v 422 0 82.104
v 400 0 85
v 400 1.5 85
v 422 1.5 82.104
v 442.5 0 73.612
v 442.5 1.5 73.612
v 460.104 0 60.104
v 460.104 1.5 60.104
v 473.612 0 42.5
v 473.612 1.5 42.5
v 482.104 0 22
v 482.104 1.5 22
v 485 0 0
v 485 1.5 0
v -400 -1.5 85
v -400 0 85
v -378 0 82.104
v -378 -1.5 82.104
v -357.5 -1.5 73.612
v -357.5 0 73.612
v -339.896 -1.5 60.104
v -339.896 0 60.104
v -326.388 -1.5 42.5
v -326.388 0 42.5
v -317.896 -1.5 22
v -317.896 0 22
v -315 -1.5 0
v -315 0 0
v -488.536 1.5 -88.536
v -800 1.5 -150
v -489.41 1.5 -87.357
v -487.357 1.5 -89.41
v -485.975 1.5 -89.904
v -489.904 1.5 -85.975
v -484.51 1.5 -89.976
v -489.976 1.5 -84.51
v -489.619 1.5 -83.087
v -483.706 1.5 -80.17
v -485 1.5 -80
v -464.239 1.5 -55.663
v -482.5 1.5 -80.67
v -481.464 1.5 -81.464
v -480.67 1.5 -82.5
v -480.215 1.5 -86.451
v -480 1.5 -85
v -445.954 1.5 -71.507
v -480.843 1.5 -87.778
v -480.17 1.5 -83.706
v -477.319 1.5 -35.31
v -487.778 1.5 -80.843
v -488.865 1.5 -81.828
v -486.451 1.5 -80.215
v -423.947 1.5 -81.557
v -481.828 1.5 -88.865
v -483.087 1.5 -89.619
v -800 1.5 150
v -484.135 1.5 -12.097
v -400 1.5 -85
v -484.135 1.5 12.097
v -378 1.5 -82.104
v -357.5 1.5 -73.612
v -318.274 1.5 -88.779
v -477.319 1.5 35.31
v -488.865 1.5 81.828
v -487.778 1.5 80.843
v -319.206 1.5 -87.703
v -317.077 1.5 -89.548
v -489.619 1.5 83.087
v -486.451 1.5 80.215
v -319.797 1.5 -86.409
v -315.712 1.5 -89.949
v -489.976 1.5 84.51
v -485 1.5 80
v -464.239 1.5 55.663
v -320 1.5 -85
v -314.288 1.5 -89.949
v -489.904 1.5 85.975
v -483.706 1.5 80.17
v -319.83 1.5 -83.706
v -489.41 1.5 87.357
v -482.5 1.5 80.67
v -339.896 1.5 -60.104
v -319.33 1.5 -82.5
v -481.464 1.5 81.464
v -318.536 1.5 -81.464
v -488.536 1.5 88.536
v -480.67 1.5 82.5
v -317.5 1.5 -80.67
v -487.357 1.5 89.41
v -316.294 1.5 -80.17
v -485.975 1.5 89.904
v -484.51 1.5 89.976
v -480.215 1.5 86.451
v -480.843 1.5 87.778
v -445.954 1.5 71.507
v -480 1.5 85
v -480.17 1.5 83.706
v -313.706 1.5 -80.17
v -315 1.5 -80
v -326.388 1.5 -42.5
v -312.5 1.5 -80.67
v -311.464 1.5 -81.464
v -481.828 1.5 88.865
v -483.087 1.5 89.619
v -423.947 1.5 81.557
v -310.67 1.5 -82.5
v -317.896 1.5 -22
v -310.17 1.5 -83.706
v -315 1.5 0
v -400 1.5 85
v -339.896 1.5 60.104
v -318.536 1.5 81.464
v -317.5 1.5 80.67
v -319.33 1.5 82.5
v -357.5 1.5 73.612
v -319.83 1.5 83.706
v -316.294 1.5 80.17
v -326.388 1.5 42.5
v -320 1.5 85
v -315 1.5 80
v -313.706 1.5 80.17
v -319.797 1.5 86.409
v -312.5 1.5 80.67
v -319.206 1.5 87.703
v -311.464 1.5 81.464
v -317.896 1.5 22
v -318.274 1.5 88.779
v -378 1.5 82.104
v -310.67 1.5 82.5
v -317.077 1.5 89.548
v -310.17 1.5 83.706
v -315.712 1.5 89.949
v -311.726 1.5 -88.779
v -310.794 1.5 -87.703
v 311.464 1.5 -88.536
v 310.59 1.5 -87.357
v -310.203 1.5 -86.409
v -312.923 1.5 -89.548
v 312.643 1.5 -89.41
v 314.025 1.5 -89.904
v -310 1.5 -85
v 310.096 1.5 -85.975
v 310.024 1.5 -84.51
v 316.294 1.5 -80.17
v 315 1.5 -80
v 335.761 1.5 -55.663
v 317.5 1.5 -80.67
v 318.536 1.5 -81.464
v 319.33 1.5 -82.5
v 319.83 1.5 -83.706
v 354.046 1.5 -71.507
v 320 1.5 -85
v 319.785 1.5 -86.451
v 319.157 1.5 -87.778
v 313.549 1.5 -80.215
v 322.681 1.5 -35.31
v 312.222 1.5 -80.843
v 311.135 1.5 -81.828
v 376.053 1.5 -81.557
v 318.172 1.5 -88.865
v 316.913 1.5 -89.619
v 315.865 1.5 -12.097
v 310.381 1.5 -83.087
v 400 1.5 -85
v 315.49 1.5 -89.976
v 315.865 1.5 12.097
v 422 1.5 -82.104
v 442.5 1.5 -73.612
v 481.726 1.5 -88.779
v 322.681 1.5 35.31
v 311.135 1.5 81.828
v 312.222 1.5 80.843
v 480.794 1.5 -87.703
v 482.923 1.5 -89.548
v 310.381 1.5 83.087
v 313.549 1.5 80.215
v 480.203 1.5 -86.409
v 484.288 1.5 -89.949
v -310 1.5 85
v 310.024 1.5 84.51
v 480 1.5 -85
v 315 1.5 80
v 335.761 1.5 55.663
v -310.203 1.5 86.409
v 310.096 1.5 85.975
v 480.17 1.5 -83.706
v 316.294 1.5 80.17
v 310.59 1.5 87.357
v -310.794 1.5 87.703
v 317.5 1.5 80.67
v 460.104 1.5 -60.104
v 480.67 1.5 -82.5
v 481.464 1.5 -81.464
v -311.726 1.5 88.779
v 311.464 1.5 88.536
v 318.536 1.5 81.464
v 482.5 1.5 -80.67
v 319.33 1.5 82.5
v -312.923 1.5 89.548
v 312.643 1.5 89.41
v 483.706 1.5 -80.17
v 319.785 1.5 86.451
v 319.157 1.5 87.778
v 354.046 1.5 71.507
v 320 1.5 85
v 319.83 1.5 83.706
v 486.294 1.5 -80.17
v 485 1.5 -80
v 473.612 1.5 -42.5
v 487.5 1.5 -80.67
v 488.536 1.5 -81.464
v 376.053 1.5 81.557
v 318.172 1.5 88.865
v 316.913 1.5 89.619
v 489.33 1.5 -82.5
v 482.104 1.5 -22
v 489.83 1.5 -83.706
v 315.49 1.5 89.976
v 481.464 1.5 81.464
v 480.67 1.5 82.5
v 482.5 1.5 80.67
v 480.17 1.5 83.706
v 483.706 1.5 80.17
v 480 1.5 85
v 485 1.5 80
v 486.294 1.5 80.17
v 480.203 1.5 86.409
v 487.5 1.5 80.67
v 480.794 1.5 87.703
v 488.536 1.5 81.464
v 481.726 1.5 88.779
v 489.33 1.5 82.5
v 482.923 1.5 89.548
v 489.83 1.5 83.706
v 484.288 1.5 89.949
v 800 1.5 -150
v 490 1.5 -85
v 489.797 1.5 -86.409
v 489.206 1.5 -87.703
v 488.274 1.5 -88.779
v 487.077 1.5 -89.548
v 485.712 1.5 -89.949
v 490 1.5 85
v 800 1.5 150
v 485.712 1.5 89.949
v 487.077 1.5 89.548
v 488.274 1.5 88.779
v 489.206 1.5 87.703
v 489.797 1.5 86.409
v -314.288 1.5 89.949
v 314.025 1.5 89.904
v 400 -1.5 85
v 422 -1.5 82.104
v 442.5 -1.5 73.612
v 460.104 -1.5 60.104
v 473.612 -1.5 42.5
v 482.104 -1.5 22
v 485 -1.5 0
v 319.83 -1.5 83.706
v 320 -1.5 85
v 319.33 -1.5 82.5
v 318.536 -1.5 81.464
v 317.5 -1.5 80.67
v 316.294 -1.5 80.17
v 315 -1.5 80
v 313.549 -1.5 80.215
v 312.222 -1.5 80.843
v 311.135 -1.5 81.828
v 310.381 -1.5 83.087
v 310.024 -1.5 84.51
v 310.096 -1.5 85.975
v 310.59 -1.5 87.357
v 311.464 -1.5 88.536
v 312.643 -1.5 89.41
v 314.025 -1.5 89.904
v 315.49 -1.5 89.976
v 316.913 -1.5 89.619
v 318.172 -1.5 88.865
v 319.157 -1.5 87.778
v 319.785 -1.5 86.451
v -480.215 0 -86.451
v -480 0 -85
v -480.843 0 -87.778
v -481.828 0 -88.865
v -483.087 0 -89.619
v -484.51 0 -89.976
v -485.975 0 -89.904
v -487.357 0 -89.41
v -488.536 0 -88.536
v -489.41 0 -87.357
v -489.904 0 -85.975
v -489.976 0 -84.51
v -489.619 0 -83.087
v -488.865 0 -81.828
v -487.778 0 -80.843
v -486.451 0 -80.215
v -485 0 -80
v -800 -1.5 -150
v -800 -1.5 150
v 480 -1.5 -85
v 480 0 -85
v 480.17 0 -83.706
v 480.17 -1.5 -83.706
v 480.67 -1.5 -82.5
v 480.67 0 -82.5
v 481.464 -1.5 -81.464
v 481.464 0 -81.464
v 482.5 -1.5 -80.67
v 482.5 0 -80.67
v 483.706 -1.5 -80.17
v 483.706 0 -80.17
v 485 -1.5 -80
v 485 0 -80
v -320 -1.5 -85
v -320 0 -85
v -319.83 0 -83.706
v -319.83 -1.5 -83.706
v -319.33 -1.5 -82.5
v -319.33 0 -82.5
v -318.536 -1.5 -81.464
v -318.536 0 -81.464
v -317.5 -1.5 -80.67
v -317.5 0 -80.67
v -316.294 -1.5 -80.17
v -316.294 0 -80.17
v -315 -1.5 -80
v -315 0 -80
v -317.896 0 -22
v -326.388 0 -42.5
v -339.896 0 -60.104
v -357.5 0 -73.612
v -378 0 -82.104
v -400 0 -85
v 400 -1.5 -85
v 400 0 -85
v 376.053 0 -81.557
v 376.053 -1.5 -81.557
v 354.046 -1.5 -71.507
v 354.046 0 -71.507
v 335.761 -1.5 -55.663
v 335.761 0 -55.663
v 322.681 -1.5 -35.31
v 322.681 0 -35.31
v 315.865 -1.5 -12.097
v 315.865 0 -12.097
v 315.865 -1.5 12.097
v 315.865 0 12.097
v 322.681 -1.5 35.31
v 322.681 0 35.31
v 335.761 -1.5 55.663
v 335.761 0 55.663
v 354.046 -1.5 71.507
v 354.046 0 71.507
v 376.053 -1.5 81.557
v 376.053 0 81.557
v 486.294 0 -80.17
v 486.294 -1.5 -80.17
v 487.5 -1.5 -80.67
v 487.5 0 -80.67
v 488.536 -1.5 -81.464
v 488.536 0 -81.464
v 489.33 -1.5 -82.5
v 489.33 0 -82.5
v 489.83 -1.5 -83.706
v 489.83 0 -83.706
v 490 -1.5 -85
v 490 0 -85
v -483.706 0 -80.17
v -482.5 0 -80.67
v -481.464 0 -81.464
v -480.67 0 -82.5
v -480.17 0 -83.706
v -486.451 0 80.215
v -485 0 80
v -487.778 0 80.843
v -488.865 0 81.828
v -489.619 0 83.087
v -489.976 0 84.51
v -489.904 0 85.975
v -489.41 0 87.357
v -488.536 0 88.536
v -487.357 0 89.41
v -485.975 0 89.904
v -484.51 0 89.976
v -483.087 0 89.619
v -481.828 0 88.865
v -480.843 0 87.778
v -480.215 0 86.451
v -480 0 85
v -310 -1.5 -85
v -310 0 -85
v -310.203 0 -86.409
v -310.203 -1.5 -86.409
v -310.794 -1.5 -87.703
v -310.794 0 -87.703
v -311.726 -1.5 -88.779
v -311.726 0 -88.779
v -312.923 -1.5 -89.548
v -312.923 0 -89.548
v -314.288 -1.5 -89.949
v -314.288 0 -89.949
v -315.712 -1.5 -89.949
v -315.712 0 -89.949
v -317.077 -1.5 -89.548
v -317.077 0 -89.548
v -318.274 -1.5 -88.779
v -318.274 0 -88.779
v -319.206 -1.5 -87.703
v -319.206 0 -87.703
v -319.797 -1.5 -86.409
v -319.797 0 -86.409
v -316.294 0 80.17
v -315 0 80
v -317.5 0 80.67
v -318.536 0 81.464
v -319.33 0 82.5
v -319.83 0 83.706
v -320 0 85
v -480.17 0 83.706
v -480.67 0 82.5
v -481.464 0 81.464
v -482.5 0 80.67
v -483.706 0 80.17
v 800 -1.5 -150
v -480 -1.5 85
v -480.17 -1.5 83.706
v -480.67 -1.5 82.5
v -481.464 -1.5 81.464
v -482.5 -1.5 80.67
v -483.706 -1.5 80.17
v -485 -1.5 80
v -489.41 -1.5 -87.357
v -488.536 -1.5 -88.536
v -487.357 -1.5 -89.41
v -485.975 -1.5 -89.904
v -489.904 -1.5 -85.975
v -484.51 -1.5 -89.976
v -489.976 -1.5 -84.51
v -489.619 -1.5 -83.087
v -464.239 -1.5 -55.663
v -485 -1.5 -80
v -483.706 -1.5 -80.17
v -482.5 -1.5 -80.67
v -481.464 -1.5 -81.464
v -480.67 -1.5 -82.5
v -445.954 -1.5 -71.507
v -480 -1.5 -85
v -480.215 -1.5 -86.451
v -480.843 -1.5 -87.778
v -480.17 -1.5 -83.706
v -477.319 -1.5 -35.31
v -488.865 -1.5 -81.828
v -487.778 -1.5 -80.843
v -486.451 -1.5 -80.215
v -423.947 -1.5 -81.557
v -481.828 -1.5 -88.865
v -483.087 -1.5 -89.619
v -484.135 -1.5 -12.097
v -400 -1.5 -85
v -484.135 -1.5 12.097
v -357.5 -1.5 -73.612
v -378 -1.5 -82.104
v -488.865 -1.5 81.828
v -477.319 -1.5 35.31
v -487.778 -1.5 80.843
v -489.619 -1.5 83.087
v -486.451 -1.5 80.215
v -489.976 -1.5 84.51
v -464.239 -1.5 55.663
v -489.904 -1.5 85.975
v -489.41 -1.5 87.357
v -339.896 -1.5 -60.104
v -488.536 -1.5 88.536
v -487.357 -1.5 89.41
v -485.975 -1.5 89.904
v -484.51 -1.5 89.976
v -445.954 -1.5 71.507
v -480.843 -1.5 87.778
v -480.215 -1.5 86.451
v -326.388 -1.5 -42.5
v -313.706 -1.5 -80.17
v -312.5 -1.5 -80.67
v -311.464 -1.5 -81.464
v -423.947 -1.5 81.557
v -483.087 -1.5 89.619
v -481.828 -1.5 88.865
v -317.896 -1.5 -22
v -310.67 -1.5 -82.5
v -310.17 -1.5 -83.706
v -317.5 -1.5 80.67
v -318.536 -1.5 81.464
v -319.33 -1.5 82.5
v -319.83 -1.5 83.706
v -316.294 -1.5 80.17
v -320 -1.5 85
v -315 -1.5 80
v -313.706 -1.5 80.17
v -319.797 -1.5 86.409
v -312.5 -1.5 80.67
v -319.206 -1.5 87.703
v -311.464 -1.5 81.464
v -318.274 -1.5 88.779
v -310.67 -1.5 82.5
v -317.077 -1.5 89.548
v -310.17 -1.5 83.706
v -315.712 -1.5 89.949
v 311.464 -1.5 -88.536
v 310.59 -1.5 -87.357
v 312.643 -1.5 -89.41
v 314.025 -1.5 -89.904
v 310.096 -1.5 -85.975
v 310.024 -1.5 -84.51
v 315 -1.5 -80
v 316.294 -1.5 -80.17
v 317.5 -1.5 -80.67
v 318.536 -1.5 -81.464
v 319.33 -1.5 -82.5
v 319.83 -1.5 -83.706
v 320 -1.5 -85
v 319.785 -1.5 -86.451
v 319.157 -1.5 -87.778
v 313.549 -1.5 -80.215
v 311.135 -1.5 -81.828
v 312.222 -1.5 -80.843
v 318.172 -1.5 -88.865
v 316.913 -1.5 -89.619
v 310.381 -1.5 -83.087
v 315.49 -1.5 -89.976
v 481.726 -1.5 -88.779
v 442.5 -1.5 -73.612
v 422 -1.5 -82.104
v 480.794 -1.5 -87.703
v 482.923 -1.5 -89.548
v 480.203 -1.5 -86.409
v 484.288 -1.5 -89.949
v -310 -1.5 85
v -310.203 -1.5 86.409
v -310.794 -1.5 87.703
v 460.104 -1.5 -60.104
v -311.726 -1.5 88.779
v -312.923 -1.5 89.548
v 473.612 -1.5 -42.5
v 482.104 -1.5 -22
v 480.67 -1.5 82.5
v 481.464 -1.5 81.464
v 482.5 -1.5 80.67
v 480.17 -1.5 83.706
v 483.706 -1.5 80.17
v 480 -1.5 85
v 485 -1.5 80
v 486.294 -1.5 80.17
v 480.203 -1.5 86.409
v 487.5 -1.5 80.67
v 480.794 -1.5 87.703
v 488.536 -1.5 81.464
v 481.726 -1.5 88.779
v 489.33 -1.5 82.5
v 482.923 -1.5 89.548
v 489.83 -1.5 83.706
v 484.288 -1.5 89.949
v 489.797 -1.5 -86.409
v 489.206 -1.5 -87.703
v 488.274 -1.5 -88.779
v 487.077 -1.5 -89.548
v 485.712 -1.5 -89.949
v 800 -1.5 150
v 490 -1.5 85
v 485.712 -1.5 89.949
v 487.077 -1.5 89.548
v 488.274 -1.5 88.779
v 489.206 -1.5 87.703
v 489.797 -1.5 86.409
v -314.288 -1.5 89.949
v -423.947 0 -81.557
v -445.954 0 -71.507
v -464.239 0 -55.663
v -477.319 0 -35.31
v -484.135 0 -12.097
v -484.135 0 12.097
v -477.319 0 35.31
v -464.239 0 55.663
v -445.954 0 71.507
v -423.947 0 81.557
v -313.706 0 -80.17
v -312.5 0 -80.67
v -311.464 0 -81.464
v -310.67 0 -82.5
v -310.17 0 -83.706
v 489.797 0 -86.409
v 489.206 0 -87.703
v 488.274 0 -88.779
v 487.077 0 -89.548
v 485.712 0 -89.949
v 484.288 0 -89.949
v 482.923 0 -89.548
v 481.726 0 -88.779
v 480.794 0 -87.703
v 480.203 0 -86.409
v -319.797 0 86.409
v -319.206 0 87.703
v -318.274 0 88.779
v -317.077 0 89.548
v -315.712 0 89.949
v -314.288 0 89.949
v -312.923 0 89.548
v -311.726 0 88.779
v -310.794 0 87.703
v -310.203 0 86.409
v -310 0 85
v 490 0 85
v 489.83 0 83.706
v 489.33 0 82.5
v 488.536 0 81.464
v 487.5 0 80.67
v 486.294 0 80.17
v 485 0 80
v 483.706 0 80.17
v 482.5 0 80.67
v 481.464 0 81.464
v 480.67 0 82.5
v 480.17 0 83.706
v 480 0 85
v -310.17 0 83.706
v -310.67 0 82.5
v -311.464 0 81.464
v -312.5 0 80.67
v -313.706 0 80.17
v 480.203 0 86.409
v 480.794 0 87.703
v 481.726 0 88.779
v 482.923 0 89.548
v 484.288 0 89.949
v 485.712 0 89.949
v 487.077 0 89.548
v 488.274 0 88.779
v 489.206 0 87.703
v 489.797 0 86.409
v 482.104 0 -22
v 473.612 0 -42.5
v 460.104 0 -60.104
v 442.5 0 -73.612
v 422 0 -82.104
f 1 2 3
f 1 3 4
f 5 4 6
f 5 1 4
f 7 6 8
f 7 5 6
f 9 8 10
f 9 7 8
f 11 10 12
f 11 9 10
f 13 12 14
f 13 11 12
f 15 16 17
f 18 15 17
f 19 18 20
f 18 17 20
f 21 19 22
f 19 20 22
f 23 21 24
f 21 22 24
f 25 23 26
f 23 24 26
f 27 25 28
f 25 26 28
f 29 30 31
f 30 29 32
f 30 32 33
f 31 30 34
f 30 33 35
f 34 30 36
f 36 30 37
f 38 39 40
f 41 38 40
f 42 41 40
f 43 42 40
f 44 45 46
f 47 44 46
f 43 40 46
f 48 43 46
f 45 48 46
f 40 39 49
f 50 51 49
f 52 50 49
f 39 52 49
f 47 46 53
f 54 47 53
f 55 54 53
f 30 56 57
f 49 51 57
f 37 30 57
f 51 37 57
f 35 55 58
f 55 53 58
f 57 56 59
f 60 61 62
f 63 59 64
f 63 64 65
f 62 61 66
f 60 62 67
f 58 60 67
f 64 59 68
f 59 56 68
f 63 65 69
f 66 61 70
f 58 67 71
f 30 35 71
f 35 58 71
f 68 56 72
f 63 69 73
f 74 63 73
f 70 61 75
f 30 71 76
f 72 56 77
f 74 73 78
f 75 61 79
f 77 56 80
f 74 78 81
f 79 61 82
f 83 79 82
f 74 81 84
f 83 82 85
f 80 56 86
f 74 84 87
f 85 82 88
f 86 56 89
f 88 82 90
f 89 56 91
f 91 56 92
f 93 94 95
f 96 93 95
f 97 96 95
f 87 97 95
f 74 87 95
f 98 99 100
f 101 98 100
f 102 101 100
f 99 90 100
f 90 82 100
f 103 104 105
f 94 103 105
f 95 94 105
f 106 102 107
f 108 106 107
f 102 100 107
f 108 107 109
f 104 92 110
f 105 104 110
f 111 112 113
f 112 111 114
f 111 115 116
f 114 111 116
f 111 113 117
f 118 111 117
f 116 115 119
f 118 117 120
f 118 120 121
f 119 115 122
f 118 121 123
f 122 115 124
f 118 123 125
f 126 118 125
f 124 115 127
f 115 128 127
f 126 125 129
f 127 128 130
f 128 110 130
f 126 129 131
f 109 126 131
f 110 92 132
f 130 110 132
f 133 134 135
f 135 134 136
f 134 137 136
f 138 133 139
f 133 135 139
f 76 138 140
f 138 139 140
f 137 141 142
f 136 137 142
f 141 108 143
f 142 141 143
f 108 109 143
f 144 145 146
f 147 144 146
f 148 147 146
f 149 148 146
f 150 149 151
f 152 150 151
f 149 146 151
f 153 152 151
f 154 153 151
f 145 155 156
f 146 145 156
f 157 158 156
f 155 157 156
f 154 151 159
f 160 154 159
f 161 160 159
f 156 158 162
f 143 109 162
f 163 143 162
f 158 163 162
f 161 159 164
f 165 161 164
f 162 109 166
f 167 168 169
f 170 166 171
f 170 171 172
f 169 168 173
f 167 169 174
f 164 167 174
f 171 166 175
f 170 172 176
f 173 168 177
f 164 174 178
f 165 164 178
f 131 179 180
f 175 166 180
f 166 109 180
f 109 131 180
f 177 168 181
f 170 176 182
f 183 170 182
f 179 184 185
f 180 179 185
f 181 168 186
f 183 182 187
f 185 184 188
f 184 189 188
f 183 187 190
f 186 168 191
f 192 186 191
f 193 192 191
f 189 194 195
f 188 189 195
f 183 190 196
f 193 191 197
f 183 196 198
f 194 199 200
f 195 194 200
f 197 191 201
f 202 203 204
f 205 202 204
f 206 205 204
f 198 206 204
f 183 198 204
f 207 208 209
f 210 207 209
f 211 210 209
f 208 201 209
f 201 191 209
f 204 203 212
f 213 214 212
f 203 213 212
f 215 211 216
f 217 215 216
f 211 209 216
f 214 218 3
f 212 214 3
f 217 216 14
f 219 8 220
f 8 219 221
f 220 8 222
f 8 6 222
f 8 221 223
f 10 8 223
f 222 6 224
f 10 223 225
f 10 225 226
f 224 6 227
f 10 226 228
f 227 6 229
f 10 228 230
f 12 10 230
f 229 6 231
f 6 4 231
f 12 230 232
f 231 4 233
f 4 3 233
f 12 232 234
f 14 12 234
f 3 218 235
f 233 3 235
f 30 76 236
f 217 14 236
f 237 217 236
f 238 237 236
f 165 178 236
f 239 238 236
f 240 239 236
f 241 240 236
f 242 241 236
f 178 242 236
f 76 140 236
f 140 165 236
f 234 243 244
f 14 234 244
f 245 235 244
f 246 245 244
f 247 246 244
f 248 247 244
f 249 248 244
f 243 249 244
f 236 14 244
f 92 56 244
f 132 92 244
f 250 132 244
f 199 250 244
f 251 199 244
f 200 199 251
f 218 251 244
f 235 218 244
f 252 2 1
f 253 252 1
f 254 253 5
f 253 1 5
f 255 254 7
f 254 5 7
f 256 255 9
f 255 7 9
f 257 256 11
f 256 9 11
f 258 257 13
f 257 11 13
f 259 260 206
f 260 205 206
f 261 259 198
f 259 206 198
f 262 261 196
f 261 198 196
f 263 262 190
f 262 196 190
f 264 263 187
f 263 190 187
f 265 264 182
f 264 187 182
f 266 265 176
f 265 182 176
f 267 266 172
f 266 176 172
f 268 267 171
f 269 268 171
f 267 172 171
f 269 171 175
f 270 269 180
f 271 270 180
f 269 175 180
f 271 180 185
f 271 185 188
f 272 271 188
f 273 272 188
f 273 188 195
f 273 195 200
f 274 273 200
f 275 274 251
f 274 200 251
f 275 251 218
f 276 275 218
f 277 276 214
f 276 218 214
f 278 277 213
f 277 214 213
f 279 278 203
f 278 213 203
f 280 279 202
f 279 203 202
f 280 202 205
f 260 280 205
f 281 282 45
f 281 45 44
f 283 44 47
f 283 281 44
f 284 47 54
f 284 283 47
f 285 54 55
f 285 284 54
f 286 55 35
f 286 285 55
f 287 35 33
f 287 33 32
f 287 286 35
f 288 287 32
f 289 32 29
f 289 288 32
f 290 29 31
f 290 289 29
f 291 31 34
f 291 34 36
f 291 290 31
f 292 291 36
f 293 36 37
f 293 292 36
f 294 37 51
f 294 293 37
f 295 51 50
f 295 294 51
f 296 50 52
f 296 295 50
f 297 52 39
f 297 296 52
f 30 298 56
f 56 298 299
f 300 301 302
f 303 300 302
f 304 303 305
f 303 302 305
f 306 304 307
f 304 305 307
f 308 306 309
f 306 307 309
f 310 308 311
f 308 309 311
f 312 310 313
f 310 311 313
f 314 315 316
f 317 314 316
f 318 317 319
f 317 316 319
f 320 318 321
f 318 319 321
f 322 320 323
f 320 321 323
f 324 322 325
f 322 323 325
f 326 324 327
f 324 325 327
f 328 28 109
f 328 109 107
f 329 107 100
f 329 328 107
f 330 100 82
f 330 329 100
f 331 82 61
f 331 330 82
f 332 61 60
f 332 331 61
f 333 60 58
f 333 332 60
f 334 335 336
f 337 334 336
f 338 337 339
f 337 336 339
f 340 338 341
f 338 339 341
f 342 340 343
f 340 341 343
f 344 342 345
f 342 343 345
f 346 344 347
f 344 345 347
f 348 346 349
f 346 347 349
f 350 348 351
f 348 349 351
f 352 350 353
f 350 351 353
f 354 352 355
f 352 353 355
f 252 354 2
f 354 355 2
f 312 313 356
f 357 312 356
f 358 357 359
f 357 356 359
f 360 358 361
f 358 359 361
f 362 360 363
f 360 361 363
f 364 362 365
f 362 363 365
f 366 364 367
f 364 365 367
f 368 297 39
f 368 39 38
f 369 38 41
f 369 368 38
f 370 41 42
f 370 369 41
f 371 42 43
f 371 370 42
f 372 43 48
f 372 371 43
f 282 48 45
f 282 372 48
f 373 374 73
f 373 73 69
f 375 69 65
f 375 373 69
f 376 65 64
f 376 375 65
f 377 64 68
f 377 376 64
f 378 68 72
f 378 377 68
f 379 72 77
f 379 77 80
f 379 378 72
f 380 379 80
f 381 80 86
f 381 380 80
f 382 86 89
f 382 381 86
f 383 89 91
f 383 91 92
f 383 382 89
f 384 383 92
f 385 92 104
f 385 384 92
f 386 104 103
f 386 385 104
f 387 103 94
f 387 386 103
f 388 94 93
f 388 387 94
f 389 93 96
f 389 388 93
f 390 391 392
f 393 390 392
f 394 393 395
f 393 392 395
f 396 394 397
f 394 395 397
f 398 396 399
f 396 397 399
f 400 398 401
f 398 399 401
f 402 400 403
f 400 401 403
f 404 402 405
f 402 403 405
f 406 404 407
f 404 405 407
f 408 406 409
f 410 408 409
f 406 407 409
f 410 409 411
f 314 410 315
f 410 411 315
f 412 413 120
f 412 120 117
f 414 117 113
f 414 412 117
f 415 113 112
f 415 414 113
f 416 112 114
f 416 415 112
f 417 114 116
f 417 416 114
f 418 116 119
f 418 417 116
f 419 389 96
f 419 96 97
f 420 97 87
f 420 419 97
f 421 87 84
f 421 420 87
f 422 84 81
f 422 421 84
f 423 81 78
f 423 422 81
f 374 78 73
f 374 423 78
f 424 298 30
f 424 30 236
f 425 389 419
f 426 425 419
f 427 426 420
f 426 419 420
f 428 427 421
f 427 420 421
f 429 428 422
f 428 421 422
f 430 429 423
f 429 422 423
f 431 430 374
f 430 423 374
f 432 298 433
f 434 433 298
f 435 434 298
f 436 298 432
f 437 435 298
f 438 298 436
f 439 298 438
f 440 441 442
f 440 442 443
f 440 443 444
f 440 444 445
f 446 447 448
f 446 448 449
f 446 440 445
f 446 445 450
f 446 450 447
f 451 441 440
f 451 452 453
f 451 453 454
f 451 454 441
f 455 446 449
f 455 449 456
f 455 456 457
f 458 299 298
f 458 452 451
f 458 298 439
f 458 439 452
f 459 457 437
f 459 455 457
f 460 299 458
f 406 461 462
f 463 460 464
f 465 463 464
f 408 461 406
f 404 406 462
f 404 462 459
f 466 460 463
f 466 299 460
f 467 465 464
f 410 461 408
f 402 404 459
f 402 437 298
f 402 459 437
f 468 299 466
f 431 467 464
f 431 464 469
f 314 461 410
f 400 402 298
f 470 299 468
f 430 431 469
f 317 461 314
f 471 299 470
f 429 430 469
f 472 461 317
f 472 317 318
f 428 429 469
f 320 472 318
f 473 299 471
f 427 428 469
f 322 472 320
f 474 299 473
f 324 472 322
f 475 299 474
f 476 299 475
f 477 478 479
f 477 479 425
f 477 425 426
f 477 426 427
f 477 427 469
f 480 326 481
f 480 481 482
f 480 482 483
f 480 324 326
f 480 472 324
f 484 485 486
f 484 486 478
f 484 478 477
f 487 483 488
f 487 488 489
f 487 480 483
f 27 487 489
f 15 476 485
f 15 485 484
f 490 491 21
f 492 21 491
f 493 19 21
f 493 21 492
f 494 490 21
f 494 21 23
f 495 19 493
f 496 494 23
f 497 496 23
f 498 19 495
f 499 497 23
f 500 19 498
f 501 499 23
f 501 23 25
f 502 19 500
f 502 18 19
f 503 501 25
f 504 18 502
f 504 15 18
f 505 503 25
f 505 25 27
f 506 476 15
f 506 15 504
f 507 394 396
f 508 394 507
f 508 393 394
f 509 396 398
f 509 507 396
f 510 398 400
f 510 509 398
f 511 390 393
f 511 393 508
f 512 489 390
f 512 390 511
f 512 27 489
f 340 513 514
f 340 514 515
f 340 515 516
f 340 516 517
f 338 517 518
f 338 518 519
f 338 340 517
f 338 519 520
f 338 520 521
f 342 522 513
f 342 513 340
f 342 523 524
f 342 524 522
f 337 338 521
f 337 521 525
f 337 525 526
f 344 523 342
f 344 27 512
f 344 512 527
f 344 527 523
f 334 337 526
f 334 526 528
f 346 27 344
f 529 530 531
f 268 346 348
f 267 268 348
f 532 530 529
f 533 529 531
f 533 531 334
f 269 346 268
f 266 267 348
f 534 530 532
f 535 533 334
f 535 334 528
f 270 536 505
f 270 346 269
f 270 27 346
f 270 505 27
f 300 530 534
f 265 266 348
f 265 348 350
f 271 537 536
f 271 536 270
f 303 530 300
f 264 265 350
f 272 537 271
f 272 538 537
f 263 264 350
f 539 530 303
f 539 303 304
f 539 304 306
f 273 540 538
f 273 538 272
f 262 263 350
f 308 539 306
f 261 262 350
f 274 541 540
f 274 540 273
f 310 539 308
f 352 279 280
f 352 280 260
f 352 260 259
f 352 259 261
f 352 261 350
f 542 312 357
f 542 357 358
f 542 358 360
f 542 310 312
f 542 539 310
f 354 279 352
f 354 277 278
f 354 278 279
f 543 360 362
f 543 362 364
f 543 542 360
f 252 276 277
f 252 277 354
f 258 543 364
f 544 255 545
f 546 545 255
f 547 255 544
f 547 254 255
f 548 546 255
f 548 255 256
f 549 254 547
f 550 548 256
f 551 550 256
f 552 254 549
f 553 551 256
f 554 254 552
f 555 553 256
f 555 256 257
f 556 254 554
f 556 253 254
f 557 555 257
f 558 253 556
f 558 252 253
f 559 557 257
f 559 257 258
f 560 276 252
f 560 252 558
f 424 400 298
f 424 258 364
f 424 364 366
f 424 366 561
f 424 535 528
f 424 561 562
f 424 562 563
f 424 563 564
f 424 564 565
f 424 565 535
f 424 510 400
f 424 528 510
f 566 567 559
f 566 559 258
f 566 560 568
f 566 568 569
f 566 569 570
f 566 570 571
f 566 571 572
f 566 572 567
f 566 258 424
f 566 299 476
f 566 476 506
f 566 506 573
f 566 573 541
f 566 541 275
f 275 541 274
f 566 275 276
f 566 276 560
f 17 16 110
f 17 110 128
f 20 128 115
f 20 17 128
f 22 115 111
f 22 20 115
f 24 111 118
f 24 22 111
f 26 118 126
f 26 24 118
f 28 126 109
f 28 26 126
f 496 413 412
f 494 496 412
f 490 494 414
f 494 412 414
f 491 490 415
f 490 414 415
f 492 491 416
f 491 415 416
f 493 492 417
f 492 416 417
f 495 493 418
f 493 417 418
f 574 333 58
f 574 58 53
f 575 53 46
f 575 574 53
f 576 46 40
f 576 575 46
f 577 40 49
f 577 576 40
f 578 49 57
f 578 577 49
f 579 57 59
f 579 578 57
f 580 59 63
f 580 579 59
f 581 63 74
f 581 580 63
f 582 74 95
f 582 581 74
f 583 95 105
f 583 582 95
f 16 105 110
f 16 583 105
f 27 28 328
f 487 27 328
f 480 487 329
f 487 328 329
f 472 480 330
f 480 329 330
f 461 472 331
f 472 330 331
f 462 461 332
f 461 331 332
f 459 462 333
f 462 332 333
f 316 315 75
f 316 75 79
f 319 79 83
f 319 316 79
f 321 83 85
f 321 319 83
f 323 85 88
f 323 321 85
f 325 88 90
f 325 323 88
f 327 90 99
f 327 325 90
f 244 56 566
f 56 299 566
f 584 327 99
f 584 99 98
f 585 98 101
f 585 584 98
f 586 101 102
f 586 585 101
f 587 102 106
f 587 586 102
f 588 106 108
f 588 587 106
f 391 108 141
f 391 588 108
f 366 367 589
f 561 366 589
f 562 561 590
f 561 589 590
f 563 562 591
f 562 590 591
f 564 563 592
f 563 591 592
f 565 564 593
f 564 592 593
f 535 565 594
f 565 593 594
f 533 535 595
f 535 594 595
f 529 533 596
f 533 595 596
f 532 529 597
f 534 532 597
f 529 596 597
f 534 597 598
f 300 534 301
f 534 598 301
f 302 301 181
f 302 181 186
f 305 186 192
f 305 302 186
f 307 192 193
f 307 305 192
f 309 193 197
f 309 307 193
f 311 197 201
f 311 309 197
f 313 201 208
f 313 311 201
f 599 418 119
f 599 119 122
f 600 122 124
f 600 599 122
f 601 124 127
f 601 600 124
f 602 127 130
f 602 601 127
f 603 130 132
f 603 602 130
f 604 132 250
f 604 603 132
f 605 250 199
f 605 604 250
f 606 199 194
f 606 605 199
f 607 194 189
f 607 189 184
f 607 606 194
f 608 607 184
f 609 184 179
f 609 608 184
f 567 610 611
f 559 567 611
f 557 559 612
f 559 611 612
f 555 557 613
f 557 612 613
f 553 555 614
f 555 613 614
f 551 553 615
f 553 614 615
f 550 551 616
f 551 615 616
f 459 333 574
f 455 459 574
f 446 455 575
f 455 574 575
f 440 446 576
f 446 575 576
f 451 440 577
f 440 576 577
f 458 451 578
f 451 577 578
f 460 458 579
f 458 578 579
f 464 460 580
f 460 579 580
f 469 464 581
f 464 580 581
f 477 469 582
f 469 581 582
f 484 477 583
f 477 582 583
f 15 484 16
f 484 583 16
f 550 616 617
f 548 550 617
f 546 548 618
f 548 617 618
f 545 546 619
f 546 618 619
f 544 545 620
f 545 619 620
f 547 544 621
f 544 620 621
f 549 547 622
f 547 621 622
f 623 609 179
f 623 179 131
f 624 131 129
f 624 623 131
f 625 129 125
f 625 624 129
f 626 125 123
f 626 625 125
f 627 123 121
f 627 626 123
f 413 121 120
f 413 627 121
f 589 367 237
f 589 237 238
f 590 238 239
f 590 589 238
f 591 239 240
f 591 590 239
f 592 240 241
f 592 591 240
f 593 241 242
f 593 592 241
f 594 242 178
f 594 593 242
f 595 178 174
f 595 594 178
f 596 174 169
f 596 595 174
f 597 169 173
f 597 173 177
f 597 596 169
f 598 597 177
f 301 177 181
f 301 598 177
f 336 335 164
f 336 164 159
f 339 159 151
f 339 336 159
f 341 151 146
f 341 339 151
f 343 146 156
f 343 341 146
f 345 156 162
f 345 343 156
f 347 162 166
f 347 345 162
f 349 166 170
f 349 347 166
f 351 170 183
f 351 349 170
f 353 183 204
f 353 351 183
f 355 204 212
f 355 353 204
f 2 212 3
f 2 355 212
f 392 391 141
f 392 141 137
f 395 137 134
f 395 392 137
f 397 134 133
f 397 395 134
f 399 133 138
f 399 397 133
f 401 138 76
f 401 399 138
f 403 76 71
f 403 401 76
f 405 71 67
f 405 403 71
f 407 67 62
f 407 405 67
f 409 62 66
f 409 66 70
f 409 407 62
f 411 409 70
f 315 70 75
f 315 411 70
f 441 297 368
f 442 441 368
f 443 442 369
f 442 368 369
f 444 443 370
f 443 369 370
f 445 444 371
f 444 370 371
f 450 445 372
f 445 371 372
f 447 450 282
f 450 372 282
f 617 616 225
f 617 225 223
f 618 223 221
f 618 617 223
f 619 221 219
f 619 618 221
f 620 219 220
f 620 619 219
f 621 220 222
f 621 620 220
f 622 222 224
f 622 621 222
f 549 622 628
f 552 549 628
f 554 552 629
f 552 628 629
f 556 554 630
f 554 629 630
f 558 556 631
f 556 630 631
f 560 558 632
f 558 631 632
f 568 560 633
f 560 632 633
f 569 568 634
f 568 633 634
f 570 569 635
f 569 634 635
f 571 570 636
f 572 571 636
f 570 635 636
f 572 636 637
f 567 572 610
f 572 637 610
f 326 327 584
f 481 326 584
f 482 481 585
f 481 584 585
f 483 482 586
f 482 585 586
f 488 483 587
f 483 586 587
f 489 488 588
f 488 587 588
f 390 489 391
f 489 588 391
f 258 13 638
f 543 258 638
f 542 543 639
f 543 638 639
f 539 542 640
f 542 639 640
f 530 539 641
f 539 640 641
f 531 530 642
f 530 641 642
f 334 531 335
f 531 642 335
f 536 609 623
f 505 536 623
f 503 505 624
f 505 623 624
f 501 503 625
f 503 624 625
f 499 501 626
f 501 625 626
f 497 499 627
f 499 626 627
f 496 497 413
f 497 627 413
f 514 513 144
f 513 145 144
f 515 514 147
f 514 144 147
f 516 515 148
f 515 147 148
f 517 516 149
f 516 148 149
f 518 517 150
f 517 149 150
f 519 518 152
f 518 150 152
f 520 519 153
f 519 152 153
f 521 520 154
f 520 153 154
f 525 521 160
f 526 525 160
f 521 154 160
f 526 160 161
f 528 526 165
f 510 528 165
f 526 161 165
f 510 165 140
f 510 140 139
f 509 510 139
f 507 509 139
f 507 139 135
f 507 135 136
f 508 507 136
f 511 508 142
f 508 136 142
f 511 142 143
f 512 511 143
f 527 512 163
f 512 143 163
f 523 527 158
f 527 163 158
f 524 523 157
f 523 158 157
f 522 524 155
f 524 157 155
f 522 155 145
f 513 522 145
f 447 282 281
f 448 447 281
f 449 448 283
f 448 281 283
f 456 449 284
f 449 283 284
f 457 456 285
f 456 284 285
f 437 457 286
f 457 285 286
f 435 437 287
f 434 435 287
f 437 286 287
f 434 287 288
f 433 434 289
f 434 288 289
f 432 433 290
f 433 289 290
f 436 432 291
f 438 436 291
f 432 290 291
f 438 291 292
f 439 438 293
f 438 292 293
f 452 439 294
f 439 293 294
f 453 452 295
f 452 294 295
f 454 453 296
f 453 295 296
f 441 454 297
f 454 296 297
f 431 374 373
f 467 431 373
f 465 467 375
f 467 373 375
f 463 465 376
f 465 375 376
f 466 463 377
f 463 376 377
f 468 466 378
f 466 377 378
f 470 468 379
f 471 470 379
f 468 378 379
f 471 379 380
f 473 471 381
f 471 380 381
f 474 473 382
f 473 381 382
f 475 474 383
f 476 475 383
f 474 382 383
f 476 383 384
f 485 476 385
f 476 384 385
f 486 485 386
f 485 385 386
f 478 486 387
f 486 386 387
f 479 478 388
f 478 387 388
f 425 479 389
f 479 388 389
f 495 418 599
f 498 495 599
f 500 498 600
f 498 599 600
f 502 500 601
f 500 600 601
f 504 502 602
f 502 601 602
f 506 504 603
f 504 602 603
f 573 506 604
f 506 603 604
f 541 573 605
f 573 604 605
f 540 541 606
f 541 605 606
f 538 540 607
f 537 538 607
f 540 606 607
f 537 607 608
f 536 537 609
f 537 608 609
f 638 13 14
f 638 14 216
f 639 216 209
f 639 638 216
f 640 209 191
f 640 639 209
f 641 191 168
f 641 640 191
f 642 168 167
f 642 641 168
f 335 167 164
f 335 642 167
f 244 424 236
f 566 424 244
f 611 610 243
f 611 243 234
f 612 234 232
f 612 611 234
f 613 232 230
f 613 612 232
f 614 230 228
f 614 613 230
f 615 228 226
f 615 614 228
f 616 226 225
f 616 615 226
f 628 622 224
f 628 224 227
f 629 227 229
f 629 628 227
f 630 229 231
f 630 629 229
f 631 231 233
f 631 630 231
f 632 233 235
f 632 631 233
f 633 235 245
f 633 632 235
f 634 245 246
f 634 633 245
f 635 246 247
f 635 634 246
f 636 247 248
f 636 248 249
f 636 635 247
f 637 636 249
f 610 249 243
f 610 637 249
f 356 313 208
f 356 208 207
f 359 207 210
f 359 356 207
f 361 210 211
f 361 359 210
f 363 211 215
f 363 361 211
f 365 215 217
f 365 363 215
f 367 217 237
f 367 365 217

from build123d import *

# Parameters (mm, degrees)
F0_W     = 1600
F0_H     = 300
F1_DEPTH = 1.5


with BuildPart() as f1:
    # F0 (on Front) → F1 (new body, symmetric)
    with BuildSketch(Plane.XZ):
        Rectangle(F0_W, F0_H)
        with BuildLine():
            Line((-315, 80), (-315, 0))
            Line((-315, 0), (-315, -80))
            ThreePointArc((-315, -80), (-311.4644660941, -81.4644660941), (-310, -85))
            ThreePointArc((-310, -85), (-315, -90), (-320, -85))
            Line((-320, -85), (-400, -85))
            Line((-400, -85), (-480, -85))
            ThreePointArc((-480, -85), (-488.5355339059, -88.5355339059), (-485, -80))
            Line((-485, -80), (-485, -5.63e-07))
            Line((-485, -5.63e-07), (-485, 80))
            ThreePointArc((-485, 80), (-488.5355339059, 88.5355339059), (-480, 85))
            Line((-480, 85), (-400, 85))
            Line((-400, 85), (-320, 85))
            ThreePointArc((-320, 85), (-315, 90), (-310, 85))
            ThreePointArc((-310, 85), (-311.4644660941, 81.4644660941), (-315, 80))
        make_face(mode=Mode.SUBTRACT)
        with BuildLine():
            Line((485, 80), (485, 0))
            Line((485, 0), (485, -80))
            ThreePointArc((485, -80), (488.5355339059, -81.4644660941), (490, -85))
            ThreePointArc((490, -85), (485, -90), (480, -85))
            Line((480, -85), (400, -85))
            Line((400, -85), (320, -85))
            ThreePointArc((320, -85), (311.4644660941, -88.5355339059), (315, -80))
            Line((315, -80), (315, -5.63e-07))
            Line((315, -5.63e-07), (315, 80))
            ThreePointArc((315, 80), (311.4644660941, 88.5355339059), (320, 85))
            Line((320, 85), (400, 85))
            Line((400, 85), (480, 85))
            ThreePointArc((480, 85), (485, 90), (490, 85))
            ThreePointArc((490, 85), (488.5355339059, 81.4644660941), (485, 80))
        make_face(mode=Mode.SUBTRACT)
        with BuildLine():
            ThreePointArc((-485, -5.63e-07), (-460.1040765999, 60.1040762018), (-400, 85))
            Line((-400, 85), (-480, 85))
            ThreePointArc((-480, 85), (-481.4644660941, 81.4644660941), (-485, 80))
            Line((-485, 80), (-485, -5.63e-07))
        make_face()
        with BuildLine():
            ThreePointArc((-400, 85), (-339.8959235991, 60.1040764009), (-315, 0))
            Line((-315, 0), (-315, 80))
            ThreePointArc((-315, 80), (-318.5355339059, 81.4644660941), (-320, 85))
            Line((-320, 85), (-400, 85))
        make_face()
        with BuildLine():
            Line((-480, -85), (-400, -85))
            ThreePointArc((-400, -85), (-460.1040762018, -60.1040765999), (-485, -5.63e-07))
            Line((-485, -5.63e-07), (-485, -80))
            ThreePointArc((-485, -80), (-481.4644660941, -81.4644660941), (-480, -85))
        make_face()
        with BuildLine():
            Line((-315, -80), (-315, 0))
            ThreePointArc((-315, 0), (-339.8959235991, -60.1040764009), (-400, -85))
            Line((-400, -85), (-320, -85))
            ThreePointArc((-320, -85), (-318.5355339059, -81.4644660941), (-315, -80))
        make_face()
        with BuildLine():
            ThreePointArc((315, -5.63e-07), (339.8959234001, 60.1040762018), (400, 85))
            Line((400, 85), (320, 85))
            ThreePointArc((320, 85), (318.5355339059, 81.4644660941), (315, 80))
            Line((315, 80), (315, -5.63e-07))
        make_face()
        with BuildLine():
            ThreePointArc((400, 85), (460.1040764009, 60.1040764009), (485, 0))
            Line((485, 0), (485, 80))
            ThreePointArc((485, 80), (481.4644660941, 81.4644660941), (480, 85))
            Line((480, 85), (400, 85))
        make_face()
        with BuildLine():
            Line((320, -85), (400, -85))
            ThreePointArc((400, -85), (339.8959237982, -60.1040765999), (315, -5.63e-07))
            Line((315, -5.63e-07), (315, -80))
            ThreePointArc((315, -80), (318.5355339059, -81.4644660941), (320, -85))
        make_face()
        with BuildLine():
            Line((485, -80), (485, 0))
            ThreePointArc((485, 0), (460.1040764009, -60.1040764009), (400, -85))
            Line((400, -85), (480, -85))
            ThreePointArc((480, -85), (481.4644660941, -81.4644660941), (485, -80))
        make_face()
    extrude(amount=F1_DEPTH, both=True)


solid = f1.part
